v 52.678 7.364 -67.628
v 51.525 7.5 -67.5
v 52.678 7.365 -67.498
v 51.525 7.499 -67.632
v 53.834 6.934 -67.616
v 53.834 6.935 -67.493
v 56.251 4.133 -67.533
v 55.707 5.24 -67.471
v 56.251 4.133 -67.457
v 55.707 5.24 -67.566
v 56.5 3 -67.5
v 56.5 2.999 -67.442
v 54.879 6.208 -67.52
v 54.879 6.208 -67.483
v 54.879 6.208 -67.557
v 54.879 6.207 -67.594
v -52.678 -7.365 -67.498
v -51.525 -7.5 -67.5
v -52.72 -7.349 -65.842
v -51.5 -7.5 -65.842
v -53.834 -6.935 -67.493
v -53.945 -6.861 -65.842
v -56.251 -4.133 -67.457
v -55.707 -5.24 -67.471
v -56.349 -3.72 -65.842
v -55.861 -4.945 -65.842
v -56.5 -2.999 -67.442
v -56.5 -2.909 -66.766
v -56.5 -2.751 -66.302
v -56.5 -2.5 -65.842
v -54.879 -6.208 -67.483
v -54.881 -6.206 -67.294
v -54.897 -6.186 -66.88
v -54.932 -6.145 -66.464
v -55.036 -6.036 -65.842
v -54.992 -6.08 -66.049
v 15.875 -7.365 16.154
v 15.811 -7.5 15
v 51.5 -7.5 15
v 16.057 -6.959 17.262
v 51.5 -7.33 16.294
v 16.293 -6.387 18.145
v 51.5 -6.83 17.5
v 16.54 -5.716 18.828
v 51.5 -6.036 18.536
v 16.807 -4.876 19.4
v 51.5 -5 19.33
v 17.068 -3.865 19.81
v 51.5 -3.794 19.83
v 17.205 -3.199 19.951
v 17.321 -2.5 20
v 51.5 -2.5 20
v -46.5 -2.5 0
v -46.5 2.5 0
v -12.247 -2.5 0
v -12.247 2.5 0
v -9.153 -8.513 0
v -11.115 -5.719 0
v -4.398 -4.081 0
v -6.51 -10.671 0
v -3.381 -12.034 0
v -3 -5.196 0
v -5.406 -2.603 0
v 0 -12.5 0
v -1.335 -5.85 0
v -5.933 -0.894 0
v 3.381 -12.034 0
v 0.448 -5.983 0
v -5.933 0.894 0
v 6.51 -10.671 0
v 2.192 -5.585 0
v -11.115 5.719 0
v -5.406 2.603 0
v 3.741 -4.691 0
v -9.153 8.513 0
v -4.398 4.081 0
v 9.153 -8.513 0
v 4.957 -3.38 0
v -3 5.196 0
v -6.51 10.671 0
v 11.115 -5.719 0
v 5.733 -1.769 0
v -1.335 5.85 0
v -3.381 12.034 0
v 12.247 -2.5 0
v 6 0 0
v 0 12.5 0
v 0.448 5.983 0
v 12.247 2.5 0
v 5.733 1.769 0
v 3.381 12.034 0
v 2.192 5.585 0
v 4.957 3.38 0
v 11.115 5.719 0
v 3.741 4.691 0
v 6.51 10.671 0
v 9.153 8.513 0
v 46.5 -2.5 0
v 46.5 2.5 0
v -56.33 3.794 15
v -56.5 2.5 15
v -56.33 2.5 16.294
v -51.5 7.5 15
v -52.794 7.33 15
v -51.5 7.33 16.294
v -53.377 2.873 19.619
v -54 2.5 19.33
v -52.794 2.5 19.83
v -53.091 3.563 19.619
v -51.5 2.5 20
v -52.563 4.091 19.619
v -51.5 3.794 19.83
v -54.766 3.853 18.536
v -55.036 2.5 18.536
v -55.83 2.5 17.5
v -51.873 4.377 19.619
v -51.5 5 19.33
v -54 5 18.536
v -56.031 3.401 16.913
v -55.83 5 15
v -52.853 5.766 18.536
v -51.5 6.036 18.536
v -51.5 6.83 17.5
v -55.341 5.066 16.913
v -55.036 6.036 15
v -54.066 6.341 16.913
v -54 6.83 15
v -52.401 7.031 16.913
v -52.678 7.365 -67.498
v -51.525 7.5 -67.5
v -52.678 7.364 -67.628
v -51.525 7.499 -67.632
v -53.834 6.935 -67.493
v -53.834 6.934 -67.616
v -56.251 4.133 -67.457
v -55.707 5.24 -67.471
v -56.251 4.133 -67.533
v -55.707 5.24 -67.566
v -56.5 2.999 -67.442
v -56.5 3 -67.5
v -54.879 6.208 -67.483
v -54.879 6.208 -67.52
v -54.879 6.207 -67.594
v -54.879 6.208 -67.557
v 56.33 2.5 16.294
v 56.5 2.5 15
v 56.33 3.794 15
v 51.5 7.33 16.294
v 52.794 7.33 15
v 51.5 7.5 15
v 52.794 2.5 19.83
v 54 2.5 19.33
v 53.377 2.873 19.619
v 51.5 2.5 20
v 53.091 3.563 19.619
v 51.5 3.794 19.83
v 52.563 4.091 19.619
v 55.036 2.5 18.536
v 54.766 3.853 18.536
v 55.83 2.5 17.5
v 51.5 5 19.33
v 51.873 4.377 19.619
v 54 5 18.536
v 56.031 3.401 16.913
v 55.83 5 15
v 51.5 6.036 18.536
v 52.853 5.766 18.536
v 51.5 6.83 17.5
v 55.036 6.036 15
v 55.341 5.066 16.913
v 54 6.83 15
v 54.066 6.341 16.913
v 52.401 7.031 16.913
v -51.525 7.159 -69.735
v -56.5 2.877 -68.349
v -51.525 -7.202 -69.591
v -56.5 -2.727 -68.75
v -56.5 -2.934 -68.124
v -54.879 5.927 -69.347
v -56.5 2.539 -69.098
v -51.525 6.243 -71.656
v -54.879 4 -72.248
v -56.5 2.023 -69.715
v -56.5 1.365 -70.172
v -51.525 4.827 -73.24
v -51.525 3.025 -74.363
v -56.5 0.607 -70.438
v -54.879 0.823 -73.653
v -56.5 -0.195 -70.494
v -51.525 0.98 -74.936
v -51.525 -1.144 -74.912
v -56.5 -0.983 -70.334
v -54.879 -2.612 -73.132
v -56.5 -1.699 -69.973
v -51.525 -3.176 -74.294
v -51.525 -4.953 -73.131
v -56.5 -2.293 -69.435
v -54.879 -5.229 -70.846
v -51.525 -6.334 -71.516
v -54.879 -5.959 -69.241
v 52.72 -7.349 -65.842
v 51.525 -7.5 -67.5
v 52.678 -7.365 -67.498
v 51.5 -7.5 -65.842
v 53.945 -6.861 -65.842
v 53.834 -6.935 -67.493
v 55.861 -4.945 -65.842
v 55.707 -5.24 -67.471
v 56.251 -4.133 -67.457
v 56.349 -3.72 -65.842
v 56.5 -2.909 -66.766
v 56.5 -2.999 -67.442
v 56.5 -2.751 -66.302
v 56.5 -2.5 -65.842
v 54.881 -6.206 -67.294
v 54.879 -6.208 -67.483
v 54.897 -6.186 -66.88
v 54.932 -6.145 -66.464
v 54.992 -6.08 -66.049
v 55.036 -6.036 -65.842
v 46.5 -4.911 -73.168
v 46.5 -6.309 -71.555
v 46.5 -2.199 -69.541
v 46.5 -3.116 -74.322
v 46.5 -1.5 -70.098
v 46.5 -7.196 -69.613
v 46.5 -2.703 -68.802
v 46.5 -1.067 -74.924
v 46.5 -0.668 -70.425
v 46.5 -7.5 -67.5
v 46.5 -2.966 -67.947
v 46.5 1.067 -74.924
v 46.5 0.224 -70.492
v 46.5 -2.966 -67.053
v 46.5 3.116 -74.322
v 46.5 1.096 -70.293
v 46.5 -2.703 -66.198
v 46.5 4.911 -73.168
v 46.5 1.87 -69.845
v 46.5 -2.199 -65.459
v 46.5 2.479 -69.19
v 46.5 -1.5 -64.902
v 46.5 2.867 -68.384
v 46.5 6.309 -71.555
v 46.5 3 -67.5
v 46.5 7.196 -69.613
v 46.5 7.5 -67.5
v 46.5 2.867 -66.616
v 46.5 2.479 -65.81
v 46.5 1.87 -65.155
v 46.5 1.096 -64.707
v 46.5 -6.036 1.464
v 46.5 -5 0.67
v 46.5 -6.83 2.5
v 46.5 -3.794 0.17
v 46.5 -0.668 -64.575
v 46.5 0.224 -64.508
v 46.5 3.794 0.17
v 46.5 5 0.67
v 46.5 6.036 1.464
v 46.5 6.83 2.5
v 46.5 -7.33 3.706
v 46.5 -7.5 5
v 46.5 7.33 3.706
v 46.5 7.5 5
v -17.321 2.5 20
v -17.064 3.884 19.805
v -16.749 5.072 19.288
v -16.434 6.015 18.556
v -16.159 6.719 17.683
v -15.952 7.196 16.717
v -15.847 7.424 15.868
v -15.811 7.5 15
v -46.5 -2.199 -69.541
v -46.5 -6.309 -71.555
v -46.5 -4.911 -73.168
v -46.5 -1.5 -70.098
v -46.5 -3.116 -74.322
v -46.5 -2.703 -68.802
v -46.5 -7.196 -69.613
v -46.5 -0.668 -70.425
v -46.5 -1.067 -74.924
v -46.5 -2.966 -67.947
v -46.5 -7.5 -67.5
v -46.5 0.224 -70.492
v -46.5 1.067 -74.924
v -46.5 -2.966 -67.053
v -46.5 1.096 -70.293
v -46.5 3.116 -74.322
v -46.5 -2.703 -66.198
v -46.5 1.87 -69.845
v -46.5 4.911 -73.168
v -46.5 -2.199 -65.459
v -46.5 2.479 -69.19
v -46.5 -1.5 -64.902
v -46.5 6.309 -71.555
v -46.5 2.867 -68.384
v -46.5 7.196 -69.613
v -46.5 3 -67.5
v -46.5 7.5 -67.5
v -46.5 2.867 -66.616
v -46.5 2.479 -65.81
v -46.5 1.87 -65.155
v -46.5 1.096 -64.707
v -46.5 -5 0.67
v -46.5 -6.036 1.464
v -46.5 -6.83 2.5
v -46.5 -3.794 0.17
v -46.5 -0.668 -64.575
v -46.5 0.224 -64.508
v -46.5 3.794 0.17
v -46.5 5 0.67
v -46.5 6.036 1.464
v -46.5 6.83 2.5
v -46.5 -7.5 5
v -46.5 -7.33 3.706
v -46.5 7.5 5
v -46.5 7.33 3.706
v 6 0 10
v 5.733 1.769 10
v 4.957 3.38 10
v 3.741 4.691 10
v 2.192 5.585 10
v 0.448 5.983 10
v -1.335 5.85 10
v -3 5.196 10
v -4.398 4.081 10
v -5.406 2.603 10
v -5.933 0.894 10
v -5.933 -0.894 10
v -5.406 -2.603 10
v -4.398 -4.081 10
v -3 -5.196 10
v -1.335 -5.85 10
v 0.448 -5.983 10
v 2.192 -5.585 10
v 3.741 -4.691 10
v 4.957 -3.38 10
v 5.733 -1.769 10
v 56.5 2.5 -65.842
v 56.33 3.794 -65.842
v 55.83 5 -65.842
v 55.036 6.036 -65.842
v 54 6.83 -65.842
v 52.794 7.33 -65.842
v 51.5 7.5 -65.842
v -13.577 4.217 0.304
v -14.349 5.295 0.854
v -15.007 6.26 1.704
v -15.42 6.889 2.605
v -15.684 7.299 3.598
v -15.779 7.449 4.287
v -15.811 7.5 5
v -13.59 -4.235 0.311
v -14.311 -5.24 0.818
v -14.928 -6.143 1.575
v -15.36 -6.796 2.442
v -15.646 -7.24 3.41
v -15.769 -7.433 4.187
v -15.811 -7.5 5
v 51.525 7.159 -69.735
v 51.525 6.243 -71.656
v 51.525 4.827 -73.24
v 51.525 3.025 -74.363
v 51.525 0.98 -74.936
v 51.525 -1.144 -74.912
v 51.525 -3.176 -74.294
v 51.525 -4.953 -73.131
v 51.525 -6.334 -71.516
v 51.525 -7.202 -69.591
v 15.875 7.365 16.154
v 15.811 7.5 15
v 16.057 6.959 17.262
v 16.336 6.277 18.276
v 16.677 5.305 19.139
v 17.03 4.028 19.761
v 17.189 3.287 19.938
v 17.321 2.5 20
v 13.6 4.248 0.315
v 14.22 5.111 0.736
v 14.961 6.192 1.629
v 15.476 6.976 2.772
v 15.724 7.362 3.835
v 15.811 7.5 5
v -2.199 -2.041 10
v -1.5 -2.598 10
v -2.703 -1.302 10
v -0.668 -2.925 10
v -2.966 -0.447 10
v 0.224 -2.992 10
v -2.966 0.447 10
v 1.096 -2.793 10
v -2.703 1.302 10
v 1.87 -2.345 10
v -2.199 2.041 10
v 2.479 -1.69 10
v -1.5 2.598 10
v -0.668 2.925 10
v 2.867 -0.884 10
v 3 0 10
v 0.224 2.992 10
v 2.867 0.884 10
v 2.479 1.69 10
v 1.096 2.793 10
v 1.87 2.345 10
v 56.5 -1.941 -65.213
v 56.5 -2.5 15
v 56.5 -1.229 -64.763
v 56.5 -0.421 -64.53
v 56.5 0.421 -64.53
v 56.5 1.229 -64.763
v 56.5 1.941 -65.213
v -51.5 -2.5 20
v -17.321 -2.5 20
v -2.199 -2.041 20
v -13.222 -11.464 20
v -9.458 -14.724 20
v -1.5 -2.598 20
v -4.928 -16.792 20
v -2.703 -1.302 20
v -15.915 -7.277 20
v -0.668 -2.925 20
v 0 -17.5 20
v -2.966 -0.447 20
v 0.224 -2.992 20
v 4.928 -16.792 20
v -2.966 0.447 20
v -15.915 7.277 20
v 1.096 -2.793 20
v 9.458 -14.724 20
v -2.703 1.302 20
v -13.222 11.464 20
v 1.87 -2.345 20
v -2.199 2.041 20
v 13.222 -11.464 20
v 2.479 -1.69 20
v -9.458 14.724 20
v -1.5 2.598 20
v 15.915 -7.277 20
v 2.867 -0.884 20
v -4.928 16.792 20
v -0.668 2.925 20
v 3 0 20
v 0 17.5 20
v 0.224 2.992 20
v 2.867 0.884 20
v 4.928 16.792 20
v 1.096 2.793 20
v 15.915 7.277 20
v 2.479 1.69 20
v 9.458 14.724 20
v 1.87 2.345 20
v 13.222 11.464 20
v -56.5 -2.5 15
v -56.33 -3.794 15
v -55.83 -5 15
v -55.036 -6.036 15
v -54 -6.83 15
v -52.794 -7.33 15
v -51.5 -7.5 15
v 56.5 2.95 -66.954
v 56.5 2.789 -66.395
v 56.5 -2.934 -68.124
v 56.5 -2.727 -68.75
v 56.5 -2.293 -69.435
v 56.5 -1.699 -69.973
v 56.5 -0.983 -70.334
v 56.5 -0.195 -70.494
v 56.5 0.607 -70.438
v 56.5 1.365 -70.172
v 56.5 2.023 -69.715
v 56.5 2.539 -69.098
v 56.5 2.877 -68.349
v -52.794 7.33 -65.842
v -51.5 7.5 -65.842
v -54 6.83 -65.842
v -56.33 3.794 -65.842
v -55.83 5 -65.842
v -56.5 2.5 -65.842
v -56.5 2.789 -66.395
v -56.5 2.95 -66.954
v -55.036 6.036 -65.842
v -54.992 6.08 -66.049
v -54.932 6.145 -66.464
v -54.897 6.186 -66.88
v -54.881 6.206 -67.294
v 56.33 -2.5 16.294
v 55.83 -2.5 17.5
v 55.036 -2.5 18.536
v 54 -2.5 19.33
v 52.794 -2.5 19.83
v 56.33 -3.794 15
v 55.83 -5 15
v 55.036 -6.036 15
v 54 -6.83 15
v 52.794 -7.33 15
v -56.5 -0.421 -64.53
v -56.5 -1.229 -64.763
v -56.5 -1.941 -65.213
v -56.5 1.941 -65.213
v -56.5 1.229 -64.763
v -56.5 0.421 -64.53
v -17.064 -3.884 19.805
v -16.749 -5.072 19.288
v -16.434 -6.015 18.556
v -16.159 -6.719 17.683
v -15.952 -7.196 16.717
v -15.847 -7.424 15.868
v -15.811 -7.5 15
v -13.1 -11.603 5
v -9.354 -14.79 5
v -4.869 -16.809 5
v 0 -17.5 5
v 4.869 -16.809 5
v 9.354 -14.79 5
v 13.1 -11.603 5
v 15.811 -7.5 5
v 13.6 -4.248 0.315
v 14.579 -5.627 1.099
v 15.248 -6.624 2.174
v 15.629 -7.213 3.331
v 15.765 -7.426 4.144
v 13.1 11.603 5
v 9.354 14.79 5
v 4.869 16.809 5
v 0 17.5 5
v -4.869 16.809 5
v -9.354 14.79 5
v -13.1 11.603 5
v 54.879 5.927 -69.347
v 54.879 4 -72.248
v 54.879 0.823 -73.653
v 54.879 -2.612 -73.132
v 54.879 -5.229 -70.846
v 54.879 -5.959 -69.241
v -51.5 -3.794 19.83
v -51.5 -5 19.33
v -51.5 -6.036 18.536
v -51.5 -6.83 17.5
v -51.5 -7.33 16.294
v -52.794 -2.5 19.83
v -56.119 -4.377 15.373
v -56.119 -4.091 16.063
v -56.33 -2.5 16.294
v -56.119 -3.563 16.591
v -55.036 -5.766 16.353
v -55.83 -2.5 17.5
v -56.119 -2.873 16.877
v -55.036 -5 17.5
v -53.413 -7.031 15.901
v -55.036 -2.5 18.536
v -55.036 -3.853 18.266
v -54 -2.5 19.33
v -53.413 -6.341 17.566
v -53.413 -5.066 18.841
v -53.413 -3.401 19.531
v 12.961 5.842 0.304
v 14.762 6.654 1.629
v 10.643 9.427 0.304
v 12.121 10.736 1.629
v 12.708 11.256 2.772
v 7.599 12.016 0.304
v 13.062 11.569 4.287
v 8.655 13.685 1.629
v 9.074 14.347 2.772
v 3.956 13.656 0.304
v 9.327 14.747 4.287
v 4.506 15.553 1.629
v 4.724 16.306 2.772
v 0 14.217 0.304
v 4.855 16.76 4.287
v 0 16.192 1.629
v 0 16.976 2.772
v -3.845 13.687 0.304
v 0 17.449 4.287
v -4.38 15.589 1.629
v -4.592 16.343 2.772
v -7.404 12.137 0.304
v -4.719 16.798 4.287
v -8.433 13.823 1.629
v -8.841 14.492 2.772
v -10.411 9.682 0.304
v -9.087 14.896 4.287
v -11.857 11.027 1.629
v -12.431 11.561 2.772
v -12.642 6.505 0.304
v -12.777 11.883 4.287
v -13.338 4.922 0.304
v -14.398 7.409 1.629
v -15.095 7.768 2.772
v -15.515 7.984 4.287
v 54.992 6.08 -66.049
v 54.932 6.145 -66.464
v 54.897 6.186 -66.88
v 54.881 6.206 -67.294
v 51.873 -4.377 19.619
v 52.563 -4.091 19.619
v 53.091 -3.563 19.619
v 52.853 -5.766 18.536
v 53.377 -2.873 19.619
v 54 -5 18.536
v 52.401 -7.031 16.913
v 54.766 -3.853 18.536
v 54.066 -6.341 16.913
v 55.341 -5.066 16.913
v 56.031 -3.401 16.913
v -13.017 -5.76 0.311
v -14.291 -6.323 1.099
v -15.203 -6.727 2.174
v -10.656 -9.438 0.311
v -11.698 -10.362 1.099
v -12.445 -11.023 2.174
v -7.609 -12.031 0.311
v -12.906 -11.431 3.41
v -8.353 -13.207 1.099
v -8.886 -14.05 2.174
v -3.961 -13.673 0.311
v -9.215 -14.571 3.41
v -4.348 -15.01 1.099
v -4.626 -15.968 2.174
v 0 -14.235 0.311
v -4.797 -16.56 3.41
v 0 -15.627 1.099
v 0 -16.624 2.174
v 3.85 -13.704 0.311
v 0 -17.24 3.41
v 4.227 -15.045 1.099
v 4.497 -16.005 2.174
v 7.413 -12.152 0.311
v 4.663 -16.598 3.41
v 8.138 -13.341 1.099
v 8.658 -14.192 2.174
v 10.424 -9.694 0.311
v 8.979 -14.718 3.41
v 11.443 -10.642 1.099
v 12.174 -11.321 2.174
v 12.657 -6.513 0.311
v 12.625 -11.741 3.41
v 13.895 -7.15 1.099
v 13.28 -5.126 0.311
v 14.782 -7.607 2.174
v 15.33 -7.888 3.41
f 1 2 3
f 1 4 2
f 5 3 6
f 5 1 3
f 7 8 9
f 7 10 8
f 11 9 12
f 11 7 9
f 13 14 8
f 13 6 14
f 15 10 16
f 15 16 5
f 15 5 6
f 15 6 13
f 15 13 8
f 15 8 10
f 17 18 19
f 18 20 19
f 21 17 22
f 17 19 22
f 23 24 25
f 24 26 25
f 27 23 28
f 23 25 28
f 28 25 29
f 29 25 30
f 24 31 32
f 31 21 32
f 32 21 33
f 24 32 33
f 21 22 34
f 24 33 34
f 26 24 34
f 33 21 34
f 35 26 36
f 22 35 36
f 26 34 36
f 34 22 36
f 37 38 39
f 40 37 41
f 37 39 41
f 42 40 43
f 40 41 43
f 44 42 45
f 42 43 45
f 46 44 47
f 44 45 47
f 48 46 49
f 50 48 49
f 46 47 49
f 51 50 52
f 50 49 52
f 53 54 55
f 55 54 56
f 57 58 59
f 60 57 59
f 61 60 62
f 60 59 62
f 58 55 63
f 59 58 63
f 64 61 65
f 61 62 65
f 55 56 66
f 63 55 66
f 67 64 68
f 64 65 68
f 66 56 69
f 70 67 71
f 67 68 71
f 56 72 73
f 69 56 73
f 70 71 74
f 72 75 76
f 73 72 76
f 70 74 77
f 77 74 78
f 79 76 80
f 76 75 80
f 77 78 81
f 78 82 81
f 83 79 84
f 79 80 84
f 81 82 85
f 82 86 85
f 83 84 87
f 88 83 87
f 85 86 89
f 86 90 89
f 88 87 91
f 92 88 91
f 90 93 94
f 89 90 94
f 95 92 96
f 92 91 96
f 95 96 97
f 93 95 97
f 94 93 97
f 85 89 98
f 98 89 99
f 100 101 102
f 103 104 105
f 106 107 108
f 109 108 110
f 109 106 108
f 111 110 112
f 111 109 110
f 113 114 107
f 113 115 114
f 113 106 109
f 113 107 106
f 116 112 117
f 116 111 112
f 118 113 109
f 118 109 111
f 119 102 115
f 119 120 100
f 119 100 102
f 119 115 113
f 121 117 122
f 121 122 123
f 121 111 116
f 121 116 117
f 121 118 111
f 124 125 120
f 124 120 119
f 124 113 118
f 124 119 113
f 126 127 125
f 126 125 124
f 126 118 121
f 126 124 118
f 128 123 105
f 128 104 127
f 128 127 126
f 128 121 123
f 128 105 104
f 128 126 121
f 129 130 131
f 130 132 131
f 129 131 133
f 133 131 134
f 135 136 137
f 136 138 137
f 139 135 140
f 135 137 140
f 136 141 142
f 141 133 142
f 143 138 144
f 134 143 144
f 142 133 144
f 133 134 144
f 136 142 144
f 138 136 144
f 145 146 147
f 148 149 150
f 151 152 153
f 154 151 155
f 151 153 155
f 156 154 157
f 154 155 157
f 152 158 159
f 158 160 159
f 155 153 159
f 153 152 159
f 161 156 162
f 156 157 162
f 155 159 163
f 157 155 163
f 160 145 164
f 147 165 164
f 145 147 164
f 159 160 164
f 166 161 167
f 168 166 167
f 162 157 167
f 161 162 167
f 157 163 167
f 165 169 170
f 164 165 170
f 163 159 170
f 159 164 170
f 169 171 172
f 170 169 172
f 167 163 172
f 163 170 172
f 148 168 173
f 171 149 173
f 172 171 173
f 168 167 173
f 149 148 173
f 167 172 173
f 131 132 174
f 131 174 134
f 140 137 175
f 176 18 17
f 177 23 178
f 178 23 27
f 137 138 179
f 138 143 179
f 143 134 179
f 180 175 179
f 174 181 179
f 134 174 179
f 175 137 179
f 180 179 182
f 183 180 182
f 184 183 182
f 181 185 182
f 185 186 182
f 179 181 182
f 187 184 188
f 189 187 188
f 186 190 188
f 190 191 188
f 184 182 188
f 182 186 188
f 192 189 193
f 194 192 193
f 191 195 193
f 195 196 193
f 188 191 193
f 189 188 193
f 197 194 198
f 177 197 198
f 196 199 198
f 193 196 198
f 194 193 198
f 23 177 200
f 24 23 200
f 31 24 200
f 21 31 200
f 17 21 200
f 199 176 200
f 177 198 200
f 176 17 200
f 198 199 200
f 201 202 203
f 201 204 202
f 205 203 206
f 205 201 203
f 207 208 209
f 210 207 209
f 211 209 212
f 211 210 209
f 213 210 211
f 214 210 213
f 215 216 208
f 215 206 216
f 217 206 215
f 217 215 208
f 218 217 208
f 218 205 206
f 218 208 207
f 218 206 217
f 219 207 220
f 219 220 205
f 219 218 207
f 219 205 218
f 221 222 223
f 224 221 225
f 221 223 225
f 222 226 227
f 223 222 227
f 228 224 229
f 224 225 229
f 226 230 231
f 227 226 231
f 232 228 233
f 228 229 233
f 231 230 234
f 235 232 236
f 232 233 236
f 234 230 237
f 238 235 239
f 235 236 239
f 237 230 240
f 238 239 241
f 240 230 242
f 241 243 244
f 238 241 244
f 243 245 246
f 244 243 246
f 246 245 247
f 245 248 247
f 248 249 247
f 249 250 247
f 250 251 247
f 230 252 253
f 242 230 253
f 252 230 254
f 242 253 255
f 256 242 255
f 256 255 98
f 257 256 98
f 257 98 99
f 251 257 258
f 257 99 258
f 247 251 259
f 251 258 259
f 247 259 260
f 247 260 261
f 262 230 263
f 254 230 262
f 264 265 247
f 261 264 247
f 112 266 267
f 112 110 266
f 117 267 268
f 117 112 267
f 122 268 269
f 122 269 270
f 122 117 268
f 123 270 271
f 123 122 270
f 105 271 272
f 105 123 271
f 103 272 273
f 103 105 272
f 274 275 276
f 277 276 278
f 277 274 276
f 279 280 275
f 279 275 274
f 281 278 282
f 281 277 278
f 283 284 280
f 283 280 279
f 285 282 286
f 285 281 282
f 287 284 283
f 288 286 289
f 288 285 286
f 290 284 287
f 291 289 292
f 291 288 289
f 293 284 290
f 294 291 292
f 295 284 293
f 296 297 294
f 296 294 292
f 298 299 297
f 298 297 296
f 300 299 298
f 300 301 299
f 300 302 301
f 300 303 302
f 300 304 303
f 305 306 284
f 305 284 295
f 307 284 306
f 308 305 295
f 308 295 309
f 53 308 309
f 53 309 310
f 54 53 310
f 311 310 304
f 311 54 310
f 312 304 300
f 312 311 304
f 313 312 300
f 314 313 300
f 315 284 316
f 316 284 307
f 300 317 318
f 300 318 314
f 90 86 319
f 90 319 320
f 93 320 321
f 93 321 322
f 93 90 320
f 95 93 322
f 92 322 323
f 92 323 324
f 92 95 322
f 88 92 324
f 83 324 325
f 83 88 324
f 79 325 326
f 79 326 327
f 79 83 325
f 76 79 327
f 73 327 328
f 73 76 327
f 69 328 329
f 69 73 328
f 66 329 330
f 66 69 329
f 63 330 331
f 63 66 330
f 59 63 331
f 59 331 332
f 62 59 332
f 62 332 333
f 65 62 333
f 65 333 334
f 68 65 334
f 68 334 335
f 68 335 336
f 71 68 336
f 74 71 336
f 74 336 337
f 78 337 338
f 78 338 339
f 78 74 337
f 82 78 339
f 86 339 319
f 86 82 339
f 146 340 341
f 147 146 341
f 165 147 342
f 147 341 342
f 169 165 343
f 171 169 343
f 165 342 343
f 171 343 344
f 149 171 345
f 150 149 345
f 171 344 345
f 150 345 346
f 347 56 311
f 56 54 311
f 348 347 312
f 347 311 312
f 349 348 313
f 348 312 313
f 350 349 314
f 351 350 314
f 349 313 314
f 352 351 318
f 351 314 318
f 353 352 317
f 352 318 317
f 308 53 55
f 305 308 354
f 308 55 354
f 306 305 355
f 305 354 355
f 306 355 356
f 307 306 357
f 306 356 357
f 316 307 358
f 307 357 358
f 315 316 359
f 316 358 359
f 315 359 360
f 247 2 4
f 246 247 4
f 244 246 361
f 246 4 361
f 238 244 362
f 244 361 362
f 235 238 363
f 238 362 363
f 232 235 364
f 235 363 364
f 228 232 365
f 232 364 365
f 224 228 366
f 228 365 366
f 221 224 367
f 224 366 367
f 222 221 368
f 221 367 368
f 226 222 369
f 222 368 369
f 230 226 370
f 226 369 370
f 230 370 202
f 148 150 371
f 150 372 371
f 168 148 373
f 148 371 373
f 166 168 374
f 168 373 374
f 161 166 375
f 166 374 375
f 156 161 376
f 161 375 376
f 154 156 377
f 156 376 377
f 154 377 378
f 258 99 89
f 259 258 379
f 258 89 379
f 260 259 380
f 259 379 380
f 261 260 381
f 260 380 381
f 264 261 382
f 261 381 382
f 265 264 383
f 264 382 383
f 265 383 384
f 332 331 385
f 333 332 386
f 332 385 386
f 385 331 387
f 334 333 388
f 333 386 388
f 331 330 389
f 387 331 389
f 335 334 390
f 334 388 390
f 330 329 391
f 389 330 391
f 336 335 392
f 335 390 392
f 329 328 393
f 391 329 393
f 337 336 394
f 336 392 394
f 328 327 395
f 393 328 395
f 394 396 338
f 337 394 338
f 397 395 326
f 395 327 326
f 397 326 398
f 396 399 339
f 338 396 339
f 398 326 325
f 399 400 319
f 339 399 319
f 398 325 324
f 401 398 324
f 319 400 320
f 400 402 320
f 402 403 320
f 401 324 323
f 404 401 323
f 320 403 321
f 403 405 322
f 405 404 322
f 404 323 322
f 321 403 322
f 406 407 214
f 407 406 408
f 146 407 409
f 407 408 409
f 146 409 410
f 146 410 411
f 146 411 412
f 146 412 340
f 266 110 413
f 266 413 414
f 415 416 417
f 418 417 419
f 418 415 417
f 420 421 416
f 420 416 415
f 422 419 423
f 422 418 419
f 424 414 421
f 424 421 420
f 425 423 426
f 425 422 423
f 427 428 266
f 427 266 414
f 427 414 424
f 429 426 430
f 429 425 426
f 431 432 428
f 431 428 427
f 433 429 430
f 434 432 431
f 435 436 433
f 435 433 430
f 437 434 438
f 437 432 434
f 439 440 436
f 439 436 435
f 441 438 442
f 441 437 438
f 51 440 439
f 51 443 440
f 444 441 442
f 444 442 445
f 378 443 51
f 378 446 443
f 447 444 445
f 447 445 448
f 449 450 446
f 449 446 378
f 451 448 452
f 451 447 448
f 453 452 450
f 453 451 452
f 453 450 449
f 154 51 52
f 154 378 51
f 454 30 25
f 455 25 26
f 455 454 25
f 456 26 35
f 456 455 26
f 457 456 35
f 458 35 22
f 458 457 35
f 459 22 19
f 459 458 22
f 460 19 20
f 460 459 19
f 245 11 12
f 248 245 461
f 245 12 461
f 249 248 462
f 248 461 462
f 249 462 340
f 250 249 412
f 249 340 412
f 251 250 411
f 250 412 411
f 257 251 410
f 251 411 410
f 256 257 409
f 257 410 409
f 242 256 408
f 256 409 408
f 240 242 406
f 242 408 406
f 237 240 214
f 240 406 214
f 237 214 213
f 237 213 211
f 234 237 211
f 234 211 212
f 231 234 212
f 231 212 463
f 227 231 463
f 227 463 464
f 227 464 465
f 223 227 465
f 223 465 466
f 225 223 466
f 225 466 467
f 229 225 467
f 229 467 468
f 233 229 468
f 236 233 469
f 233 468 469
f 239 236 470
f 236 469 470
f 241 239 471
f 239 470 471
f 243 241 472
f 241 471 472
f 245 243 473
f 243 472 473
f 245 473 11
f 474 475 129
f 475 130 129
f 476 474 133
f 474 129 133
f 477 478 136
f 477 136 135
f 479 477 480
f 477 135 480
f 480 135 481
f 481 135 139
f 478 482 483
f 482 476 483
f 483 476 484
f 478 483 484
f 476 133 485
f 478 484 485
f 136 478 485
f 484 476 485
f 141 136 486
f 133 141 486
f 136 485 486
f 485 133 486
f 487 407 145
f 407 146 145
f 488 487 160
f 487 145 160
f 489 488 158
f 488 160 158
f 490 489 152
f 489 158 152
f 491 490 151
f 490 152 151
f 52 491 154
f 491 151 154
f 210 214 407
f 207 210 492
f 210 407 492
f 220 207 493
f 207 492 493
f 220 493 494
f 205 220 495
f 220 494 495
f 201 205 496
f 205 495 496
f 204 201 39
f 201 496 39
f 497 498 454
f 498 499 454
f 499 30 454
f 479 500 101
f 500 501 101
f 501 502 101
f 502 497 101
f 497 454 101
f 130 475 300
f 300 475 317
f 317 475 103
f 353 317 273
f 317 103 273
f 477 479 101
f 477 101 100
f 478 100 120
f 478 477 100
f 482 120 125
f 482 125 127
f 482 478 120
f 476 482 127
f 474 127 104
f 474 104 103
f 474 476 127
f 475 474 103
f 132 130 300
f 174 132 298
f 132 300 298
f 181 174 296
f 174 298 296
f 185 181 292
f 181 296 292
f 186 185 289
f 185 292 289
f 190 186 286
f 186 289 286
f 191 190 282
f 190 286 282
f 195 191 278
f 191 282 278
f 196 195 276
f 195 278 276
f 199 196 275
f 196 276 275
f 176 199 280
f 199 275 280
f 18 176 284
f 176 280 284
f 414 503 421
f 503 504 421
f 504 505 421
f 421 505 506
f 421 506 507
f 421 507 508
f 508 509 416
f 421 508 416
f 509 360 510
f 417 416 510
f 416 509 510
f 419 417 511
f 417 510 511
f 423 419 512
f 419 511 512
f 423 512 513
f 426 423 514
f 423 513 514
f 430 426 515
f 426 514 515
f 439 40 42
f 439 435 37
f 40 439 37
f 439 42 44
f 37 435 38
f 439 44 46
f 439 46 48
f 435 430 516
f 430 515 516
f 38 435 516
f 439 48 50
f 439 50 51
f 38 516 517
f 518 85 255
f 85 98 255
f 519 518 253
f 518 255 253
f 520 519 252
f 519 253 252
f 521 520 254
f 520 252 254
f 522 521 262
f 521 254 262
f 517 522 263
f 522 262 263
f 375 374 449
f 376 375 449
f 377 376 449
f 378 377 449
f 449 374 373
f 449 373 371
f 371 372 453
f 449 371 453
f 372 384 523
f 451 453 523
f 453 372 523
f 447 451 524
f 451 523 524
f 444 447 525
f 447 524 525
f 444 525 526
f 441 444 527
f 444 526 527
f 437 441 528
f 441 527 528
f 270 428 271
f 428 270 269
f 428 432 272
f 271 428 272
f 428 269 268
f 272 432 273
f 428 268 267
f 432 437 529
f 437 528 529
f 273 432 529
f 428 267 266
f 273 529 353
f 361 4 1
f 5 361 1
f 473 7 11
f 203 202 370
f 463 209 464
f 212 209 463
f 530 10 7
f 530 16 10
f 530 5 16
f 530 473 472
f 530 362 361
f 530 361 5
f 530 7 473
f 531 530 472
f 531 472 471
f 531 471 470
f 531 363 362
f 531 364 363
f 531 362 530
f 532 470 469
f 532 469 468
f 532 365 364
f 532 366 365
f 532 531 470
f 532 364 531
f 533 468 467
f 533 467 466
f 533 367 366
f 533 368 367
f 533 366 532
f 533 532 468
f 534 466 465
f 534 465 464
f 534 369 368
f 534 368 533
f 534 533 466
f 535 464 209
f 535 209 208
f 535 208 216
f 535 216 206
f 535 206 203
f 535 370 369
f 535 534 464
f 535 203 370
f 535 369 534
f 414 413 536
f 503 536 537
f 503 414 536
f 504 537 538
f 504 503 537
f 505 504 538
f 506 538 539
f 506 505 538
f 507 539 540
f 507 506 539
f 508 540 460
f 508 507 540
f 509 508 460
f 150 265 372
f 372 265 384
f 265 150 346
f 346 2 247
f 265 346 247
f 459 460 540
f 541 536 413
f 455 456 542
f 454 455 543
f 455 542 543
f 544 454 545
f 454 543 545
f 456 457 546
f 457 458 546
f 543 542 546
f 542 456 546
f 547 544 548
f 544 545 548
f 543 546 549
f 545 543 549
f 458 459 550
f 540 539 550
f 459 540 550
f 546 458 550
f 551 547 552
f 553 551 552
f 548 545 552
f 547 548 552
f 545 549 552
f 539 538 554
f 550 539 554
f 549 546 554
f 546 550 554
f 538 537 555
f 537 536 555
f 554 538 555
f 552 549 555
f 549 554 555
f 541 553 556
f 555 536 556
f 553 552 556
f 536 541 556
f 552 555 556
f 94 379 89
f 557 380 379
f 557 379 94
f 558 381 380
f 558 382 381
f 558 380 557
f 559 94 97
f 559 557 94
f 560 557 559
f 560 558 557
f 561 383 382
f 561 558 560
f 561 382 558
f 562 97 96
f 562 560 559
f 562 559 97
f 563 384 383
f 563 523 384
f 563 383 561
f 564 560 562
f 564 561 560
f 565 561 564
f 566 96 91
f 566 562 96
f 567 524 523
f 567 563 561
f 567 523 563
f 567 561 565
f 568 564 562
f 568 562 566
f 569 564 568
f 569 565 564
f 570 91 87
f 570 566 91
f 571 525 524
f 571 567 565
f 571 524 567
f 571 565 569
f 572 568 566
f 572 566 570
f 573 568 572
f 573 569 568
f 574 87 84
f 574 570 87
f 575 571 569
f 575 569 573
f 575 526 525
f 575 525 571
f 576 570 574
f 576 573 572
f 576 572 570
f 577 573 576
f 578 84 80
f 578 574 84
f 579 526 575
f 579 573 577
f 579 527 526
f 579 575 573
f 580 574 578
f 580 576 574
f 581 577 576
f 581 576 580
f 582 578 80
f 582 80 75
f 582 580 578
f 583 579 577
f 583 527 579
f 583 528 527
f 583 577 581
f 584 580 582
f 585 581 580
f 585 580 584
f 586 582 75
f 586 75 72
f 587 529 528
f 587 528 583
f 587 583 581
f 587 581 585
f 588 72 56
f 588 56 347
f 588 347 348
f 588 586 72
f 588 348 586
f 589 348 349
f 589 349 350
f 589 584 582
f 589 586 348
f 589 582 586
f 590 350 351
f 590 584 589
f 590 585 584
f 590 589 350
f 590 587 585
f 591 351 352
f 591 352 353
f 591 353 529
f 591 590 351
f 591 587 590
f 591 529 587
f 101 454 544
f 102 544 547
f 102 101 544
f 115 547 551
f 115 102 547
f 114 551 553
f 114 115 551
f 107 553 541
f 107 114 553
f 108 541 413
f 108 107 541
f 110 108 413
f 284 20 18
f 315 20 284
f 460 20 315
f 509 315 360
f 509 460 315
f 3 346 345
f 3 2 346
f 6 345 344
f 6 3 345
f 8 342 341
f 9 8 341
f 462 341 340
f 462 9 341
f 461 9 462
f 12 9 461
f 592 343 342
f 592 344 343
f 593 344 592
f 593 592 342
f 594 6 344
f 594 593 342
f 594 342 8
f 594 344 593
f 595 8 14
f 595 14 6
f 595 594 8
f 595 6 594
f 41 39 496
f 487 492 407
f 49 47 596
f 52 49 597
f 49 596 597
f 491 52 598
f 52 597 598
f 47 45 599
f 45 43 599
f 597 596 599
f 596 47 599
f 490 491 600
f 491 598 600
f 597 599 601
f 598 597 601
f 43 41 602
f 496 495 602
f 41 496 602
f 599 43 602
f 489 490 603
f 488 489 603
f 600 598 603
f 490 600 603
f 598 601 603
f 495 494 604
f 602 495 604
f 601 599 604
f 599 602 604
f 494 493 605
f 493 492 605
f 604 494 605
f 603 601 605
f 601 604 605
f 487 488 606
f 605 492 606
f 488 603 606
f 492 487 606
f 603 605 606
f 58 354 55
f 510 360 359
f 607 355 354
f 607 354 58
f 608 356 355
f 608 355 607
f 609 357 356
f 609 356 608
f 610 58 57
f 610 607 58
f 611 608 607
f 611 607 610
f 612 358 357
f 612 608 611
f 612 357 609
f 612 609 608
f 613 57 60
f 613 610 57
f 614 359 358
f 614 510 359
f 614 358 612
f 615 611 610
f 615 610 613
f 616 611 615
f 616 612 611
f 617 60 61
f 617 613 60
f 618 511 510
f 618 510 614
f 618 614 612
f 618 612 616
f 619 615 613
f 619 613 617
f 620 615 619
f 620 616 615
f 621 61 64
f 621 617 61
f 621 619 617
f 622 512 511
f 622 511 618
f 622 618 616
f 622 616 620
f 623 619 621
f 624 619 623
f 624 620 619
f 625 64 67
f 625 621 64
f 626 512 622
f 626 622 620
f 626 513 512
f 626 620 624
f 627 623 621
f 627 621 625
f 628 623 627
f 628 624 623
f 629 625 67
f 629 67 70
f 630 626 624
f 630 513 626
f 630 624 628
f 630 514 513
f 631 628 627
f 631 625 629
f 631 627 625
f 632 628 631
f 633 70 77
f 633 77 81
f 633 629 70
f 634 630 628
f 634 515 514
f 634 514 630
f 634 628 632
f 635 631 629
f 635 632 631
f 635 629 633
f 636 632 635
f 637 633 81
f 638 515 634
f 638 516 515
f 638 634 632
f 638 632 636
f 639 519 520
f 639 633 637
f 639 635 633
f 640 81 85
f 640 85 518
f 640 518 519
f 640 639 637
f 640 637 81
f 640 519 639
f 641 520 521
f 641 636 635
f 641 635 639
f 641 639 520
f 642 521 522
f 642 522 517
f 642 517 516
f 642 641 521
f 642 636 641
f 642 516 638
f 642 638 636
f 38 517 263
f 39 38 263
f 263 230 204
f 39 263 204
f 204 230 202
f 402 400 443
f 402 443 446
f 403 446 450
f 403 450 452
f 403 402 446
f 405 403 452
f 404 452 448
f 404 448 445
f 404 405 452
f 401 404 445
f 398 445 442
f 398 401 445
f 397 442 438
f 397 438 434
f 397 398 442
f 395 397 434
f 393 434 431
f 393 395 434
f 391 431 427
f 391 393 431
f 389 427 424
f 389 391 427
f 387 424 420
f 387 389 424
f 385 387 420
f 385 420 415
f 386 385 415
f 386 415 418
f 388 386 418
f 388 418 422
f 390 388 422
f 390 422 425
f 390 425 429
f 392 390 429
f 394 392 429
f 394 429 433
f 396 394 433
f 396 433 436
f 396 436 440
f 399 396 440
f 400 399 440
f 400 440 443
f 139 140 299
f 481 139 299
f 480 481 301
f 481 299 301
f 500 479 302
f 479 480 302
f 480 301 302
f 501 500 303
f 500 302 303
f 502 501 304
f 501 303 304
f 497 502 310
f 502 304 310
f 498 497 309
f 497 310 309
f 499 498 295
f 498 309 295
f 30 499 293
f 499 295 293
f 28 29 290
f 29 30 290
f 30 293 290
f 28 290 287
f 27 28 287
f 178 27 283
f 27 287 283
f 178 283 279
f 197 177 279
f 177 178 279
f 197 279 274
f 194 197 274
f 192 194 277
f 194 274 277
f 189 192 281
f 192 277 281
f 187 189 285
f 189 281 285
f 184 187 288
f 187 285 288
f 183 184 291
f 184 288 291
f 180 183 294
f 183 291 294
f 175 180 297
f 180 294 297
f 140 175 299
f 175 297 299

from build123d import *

# Parameters (mm, degrees)
F0_W     = 10
F0_H     = 15
F0_R     = 6
F0_R_2   = 3
F1_DEPTH = 20
F2_DEPTH = 75
F3_DEPTH = 10
F4_R     = 3
F5_DEPTH = 113.001
F6_R     = 5


with BuildPart() as f1:
    # F0 (on Top) → F1 (new body)
    with BuildSketch(Plane.XY):
        with Locations((-51.5, 0)):
            Rectangle(F0_W, F0_H)
        with BuildLine():
            ThreePointArc((-15.8113883008, -7.5), (-17.5, 0), (-15.8113883008, 7.5))
            Line((-15.8113883008, 7.5), (-46.5, 7.5))
            Line((-46.5, 7.5), (-46.5, -7.5))
            Line((-46.5, -7.5), (-15.8113883008, -7.5))
        make_face()
        with BuildLine():
            ThreePointArc((15.8113883008, -7.5), (17.0726286093, -3.843872054), (17.5, 0))
            ThreePointArc((17.5, 0), (17.0726286093, 3.843872054), (15.8113883008, 7.5))
            Line((15.8113883008, 7.5), (-15.8113883008, 7.5))
            ThreePointArc((-15.8113883008, 7.5), (-17.5, 0), (-15.8113883008, -7.5))
            Line((-15.8113883008, -7.5), (15.8113883008, -7.5))
        make_face()
        Circle(F0_R, mode=Mode.SUBTRACT)
        with BuildLine():
            Line((-15.8113883008, 7.5), (15.8113883008, 7.5))
            ThreePointArc((15.8113883008, 7.5), (0, 17.5), (-15.8113883008, 7.5))
        make_face()
        with BuildLine():
            ThreePointArc((-15.8113883008, -7.5), (0, -17.5), (15.8113883008, -7.5))
            Line((15.8113883008, -7.5), (-15.8113883008, -7.5))
        make_face()
        Circle(F0_R)
        Circle(F0_R_2, mode=Mode.SUBTRACT)
        with BuildLine():
            ThreePointArc((15.8113883008, 7.5), (17.0726286093, 3.843872054), (17.5, 0))
            ThreePointArc((17.5, 0), (17.0726286093, -3.843872054), (15.8113883008, -7.5))
            Line((15.8113883008, -7.5), (46.5, -7.5))
            Line((46.5, -7.5), (46.5, 7.5))
            Line((46.5, 7.5), (15.8113883008, 7.5))
        make_face()
        with Locations((51.5, 0)):
            Rectangle(F0_W, F0_H)
    extrude(amount=F1_DEPTH)

    # F0 (on Top) → F2 (join)
    with BuildSketch(Plane.XY):
        with Locations((-51.5, 0)):
            Rectangle(F0_W, F0_H)
        with Locations((51.5, 0)):
            Rectangle(F0_W, F0_H)
    extrude(amount=-F2_DEPTH)

    # F0 (on Top) → F3 (cut)
    with BuildSketch(Plane.XY):
        Circle(F0_R)
        Circle(F0_R_2, mode=Mode.SUBTRACT)
    extrude(amount=F3_DEPTH, mode=Mode.SUBTRACT)

    # F4 (on face) → F5 (cut, through all)
    with BuildSketch(Plane.YZ.offset(56.5)):
        with BuildLine():
            Line((7.5, -75), (7.5, -67.5))
            ThreePointArc((7.5, -67.5), (5.3033008589, -72.8033008589), (0, -75))
            Line((0, -75), (7.5, -75))
        make_face()
        with BuildLine():
            Line((-7.5, -75), (0, -75))
            ThreePointArc((0, -75), (-5.3033008589, -72.8033008589), (-7.5, -67.5))
            Line((-7.5, -67.5), (-7.5, -75))
        make_face()
        with Locations((0, -67.5)):
            Circle(F4_R)
    extrude(amount=-F5_DEPTH, mode=Mode.SUBTRACT)

    # F6
    f6_edges = [f1.edges().sort_by_distance(p)[0] for p in [
        (-36.155694, -7.5, 20),
        (-56.5, -7.5, -23.75),
        (56.5, -7.5, -23.75),
        (36.155694, -7.5, 20),
        (56.5, 0, 20),
        (-56.5, 0, 20),
        (-36.155694, 7.5, 20),
        (36.155694, 7.5, 20),
        (0, -17.5, 0),
        (-31.155694, -7.5, 0),
        (31.155694, -7.5, 0),
        (-31.155694, 7.5, 0),
        (31.155694, 7.5, 0),
        (0, 17.5, 0),
    ]]
    fillet(f6_edges, radius=F6_R)


solid = f1.part
